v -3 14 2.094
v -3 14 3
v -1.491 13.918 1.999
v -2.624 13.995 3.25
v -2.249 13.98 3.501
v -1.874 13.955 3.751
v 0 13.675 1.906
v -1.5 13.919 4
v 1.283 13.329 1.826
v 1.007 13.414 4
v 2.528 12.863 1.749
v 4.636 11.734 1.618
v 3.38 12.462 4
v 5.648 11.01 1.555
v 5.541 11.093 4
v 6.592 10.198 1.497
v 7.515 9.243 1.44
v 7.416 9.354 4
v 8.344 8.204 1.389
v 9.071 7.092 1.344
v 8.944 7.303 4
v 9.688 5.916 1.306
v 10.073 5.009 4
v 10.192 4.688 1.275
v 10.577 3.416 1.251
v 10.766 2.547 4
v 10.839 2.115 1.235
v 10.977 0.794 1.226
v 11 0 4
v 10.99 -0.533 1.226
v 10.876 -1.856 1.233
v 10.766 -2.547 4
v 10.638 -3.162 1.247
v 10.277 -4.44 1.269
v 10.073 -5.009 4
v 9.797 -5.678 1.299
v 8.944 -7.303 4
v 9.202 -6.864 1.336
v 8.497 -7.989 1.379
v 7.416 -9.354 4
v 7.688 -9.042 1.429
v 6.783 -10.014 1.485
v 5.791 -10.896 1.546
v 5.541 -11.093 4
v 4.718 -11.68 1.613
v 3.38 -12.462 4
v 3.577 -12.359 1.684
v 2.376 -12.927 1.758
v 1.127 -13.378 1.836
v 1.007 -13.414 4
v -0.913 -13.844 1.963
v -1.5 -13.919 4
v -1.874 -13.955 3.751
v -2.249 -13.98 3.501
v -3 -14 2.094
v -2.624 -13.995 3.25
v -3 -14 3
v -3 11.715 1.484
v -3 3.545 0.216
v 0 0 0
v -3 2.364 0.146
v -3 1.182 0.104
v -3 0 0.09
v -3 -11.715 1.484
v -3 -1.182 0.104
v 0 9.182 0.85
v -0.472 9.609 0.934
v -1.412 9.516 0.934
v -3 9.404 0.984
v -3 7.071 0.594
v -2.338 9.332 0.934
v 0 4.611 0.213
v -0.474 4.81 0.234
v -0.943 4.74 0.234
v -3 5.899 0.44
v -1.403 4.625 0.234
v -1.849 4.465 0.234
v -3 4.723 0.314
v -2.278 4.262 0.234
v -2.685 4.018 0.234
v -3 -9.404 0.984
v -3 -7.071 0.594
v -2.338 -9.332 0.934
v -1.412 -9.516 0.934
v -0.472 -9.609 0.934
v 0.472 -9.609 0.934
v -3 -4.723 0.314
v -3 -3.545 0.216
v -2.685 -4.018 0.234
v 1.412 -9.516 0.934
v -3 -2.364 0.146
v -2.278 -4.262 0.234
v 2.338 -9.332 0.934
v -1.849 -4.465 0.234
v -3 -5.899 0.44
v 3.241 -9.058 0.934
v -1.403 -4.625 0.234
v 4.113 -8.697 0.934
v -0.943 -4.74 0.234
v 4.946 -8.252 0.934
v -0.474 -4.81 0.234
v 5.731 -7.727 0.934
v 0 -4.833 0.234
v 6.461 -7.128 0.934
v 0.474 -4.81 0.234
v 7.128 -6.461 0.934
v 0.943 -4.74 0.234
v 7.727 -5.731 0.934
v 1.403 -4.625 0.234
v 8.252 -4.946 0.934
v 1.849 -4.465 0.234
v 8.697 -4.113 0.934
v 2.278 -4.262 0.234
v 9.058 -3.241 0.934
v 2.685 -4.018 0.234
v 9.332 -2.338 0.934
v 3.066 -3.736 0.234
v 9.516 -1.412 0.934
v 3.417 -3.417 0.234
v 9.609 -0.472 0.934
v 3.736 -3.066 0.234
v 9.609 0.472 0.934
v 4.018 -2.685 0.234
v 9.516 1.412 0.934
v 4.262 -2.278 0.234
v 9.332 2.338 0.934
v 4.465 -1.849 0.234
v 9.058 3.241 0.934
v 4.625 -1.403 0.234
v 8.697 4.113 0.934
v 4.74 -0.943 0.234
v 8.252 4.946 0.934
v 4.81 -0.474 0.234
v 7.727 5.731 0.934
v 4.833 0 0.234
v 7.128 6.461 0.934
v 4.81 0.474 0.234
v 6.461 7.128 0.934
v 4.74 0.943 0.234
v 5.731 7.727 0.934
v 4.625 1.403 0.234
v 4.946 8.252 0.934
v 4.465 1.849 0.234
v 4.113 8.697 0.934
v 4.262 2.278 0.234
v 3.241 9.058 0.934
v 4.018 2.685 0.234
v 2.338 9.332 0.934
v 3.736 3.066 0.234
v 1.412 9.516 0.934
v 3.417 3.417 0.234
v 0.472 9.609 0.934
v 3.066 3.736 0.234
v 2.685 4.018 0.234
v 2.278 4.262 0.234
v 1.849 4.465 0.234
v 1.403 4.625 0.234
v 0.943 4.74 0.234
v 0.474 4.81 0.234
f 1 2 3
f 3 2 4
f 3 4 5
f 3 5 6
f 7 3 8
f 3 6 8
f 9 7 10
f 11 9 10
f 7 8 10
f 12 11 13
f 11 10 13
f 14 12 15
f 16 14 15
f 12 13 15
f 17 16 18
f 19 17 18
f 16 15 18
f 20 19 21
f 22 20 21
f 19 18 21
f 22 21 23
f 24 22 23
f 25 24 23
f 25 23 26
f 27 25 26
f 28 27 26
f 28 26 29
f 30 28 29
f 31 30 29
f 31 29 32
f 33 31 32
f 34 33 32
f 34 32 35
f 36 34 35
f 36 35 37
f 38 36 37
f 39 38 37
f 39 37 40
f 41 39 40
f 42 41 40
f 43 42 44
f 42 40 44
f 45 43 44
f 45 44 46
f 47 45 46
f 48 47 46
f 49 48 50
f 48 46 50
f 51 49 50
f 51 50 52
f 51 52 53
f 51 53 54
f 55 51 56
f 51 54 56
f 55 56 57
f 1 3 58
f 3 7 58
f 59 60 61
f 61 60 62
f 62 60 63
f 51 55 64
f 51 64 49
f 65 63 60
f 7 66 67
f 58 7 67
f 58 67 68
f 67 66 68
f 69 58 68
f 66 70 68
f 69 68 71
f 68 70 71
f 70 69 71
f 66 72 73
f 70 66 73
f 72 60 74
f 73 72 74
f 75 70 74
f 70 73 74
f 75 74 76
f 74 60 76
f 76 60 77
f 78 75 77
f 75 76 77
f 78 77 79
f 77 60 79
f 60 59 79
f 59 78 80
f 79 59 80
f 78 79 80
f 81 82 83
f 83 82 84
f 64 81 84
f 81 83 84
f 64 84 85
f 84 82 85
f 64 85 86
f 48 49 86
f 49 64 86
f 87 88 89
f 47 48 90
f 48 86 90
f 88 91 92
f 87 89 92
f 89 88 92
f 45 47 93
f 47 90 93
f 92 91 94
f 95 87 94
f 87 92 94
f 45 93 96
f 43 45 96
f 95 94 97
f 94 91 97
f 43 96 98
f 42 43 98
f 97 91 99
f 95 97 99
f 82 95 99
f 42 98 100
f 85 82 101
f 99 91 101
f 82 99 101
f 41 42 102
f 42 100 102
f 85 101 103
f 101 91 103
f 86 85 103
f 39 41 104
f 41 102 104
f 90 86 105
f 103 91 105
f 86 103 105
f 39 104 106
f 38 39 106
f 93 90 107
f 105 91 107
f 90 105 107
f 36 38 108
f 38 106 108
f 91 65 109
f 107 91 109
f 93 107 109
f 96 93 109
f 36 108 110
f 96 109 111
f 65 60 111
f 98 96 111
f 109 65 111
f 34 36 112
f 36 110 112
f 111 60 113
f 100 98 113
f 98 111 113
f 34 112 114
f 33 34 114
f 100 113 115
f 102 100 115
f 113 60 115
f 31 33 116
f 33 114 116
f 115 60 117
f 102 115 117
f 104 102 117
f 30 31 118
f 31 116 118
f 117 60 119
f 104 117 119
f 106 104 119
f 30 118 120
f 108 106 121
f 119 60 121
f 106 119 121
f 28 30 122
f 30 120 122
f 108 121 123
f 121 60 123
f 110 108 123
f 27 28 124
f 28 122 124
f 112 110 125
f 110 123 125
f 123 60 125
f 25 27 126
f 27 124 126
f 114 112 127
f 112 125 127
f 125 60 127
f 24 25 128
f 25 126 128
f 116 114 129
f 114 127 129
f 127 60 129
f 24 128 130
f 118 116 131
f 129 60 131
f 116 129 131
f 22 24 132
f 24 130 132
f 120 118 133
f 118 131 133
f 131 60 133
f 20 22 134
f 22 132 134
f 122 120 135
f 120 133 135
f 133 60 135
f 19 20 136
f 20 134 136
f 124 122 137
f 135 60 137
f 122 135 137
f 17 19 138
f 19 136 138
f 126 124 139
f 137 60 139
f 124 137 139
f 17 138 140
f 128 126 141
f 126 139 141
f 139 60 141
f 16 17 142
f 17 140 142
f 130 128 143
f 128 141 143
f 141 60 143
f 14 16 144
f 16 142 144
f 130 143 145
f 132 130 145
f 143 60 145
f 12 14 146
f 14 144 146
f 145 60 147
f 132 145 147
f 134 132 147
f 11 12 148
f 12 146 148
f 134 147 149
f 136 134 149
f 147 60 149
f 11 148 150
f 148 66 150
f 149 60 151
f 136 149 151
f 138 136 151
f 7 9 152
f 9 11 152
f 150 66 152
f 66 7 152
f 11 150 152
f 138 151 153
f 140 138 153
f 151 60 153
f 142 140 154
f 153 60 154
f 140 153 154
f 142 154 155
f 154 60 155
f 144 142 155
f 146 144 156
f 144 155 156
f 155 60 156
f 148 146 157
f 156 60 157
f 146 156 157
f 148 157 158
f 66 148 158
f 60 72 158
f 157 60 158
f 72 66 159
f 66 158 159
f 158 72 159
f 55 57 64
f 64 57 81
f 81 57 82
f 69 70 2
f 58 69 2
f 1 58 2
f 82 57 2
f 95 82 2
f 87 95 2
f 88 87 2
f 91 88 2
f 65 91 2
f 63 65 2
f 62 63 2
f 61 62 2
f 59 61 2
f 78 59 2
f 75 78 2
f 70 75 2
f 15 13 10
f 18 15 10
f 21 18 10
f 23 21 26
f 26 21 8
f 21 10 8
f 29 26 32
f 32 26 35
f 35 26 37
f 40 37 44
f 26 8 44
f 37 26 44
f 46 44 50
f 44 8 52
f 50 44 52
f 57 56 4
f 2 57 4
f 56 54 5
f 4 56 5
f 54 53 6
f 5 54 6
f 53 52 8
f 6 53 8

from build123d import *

# Parameters (mm, degrees)
SKETCH_6_R          = 15
CUT_EXTRUDE_1_DEPTH = 5
CHAMFER_1_SIZE      = 1
CHAMFER_1_SIZE2     = 1.5


with BuildPart() as part:
    # Эскиз5 → Повернуть1 (revolve)
    with BuildSketch(Plane(origin=(0, 0, 0), x_dir=(0, 0, -1), z_dir=(1, 0, 0))):
        with BuildLine():
            Line((-4, 0), (-4, 15))
            Line((-4, 15), (-2.303039929, 15))
            ThreePointArc((-2.303039929, 15), (-0.579113709, 7.587884964), (0, 0))
            Line((0, 0), (-4, 0))
        make_face()
    revolve(axis=Axis((0, 0, -1), (0, 0, 1)))

    # Эскиз6 → Вырез-Вытянуть1 (cut, through all)
    with BuildSketch(Plane.XY.offset(4)):
        Circle(SKETCH_6_R)
        with BuildLine():
            Line((-3, -14), (-3, 14))
            ThreePointArc((-3, 14), (11, 0), (-3, -14))
        make_face(mode=Mode.SUBTRACT)
    extrude(amount=-CUT_EXTRUDE_1_DEPTH, mode=Mode.SUBTRACT)

    # Фаска1
    chamfer_1_edges = [part.edges().sort_by_distance(p)[0] for p in [
        (-3, 0, 4),
    ]]
    chamfer_1_side = [part.faces().sort_by_distance(p)[0] for p in [
        (-3, 0, 2.321648578),
    ]]
    chamfer(chamfer_1_edges, length=CHAMFER_1_SIZE, length2=CHAMFER_1_SIZE2, reference=chamfer_1_side[0])


solid = part.part
